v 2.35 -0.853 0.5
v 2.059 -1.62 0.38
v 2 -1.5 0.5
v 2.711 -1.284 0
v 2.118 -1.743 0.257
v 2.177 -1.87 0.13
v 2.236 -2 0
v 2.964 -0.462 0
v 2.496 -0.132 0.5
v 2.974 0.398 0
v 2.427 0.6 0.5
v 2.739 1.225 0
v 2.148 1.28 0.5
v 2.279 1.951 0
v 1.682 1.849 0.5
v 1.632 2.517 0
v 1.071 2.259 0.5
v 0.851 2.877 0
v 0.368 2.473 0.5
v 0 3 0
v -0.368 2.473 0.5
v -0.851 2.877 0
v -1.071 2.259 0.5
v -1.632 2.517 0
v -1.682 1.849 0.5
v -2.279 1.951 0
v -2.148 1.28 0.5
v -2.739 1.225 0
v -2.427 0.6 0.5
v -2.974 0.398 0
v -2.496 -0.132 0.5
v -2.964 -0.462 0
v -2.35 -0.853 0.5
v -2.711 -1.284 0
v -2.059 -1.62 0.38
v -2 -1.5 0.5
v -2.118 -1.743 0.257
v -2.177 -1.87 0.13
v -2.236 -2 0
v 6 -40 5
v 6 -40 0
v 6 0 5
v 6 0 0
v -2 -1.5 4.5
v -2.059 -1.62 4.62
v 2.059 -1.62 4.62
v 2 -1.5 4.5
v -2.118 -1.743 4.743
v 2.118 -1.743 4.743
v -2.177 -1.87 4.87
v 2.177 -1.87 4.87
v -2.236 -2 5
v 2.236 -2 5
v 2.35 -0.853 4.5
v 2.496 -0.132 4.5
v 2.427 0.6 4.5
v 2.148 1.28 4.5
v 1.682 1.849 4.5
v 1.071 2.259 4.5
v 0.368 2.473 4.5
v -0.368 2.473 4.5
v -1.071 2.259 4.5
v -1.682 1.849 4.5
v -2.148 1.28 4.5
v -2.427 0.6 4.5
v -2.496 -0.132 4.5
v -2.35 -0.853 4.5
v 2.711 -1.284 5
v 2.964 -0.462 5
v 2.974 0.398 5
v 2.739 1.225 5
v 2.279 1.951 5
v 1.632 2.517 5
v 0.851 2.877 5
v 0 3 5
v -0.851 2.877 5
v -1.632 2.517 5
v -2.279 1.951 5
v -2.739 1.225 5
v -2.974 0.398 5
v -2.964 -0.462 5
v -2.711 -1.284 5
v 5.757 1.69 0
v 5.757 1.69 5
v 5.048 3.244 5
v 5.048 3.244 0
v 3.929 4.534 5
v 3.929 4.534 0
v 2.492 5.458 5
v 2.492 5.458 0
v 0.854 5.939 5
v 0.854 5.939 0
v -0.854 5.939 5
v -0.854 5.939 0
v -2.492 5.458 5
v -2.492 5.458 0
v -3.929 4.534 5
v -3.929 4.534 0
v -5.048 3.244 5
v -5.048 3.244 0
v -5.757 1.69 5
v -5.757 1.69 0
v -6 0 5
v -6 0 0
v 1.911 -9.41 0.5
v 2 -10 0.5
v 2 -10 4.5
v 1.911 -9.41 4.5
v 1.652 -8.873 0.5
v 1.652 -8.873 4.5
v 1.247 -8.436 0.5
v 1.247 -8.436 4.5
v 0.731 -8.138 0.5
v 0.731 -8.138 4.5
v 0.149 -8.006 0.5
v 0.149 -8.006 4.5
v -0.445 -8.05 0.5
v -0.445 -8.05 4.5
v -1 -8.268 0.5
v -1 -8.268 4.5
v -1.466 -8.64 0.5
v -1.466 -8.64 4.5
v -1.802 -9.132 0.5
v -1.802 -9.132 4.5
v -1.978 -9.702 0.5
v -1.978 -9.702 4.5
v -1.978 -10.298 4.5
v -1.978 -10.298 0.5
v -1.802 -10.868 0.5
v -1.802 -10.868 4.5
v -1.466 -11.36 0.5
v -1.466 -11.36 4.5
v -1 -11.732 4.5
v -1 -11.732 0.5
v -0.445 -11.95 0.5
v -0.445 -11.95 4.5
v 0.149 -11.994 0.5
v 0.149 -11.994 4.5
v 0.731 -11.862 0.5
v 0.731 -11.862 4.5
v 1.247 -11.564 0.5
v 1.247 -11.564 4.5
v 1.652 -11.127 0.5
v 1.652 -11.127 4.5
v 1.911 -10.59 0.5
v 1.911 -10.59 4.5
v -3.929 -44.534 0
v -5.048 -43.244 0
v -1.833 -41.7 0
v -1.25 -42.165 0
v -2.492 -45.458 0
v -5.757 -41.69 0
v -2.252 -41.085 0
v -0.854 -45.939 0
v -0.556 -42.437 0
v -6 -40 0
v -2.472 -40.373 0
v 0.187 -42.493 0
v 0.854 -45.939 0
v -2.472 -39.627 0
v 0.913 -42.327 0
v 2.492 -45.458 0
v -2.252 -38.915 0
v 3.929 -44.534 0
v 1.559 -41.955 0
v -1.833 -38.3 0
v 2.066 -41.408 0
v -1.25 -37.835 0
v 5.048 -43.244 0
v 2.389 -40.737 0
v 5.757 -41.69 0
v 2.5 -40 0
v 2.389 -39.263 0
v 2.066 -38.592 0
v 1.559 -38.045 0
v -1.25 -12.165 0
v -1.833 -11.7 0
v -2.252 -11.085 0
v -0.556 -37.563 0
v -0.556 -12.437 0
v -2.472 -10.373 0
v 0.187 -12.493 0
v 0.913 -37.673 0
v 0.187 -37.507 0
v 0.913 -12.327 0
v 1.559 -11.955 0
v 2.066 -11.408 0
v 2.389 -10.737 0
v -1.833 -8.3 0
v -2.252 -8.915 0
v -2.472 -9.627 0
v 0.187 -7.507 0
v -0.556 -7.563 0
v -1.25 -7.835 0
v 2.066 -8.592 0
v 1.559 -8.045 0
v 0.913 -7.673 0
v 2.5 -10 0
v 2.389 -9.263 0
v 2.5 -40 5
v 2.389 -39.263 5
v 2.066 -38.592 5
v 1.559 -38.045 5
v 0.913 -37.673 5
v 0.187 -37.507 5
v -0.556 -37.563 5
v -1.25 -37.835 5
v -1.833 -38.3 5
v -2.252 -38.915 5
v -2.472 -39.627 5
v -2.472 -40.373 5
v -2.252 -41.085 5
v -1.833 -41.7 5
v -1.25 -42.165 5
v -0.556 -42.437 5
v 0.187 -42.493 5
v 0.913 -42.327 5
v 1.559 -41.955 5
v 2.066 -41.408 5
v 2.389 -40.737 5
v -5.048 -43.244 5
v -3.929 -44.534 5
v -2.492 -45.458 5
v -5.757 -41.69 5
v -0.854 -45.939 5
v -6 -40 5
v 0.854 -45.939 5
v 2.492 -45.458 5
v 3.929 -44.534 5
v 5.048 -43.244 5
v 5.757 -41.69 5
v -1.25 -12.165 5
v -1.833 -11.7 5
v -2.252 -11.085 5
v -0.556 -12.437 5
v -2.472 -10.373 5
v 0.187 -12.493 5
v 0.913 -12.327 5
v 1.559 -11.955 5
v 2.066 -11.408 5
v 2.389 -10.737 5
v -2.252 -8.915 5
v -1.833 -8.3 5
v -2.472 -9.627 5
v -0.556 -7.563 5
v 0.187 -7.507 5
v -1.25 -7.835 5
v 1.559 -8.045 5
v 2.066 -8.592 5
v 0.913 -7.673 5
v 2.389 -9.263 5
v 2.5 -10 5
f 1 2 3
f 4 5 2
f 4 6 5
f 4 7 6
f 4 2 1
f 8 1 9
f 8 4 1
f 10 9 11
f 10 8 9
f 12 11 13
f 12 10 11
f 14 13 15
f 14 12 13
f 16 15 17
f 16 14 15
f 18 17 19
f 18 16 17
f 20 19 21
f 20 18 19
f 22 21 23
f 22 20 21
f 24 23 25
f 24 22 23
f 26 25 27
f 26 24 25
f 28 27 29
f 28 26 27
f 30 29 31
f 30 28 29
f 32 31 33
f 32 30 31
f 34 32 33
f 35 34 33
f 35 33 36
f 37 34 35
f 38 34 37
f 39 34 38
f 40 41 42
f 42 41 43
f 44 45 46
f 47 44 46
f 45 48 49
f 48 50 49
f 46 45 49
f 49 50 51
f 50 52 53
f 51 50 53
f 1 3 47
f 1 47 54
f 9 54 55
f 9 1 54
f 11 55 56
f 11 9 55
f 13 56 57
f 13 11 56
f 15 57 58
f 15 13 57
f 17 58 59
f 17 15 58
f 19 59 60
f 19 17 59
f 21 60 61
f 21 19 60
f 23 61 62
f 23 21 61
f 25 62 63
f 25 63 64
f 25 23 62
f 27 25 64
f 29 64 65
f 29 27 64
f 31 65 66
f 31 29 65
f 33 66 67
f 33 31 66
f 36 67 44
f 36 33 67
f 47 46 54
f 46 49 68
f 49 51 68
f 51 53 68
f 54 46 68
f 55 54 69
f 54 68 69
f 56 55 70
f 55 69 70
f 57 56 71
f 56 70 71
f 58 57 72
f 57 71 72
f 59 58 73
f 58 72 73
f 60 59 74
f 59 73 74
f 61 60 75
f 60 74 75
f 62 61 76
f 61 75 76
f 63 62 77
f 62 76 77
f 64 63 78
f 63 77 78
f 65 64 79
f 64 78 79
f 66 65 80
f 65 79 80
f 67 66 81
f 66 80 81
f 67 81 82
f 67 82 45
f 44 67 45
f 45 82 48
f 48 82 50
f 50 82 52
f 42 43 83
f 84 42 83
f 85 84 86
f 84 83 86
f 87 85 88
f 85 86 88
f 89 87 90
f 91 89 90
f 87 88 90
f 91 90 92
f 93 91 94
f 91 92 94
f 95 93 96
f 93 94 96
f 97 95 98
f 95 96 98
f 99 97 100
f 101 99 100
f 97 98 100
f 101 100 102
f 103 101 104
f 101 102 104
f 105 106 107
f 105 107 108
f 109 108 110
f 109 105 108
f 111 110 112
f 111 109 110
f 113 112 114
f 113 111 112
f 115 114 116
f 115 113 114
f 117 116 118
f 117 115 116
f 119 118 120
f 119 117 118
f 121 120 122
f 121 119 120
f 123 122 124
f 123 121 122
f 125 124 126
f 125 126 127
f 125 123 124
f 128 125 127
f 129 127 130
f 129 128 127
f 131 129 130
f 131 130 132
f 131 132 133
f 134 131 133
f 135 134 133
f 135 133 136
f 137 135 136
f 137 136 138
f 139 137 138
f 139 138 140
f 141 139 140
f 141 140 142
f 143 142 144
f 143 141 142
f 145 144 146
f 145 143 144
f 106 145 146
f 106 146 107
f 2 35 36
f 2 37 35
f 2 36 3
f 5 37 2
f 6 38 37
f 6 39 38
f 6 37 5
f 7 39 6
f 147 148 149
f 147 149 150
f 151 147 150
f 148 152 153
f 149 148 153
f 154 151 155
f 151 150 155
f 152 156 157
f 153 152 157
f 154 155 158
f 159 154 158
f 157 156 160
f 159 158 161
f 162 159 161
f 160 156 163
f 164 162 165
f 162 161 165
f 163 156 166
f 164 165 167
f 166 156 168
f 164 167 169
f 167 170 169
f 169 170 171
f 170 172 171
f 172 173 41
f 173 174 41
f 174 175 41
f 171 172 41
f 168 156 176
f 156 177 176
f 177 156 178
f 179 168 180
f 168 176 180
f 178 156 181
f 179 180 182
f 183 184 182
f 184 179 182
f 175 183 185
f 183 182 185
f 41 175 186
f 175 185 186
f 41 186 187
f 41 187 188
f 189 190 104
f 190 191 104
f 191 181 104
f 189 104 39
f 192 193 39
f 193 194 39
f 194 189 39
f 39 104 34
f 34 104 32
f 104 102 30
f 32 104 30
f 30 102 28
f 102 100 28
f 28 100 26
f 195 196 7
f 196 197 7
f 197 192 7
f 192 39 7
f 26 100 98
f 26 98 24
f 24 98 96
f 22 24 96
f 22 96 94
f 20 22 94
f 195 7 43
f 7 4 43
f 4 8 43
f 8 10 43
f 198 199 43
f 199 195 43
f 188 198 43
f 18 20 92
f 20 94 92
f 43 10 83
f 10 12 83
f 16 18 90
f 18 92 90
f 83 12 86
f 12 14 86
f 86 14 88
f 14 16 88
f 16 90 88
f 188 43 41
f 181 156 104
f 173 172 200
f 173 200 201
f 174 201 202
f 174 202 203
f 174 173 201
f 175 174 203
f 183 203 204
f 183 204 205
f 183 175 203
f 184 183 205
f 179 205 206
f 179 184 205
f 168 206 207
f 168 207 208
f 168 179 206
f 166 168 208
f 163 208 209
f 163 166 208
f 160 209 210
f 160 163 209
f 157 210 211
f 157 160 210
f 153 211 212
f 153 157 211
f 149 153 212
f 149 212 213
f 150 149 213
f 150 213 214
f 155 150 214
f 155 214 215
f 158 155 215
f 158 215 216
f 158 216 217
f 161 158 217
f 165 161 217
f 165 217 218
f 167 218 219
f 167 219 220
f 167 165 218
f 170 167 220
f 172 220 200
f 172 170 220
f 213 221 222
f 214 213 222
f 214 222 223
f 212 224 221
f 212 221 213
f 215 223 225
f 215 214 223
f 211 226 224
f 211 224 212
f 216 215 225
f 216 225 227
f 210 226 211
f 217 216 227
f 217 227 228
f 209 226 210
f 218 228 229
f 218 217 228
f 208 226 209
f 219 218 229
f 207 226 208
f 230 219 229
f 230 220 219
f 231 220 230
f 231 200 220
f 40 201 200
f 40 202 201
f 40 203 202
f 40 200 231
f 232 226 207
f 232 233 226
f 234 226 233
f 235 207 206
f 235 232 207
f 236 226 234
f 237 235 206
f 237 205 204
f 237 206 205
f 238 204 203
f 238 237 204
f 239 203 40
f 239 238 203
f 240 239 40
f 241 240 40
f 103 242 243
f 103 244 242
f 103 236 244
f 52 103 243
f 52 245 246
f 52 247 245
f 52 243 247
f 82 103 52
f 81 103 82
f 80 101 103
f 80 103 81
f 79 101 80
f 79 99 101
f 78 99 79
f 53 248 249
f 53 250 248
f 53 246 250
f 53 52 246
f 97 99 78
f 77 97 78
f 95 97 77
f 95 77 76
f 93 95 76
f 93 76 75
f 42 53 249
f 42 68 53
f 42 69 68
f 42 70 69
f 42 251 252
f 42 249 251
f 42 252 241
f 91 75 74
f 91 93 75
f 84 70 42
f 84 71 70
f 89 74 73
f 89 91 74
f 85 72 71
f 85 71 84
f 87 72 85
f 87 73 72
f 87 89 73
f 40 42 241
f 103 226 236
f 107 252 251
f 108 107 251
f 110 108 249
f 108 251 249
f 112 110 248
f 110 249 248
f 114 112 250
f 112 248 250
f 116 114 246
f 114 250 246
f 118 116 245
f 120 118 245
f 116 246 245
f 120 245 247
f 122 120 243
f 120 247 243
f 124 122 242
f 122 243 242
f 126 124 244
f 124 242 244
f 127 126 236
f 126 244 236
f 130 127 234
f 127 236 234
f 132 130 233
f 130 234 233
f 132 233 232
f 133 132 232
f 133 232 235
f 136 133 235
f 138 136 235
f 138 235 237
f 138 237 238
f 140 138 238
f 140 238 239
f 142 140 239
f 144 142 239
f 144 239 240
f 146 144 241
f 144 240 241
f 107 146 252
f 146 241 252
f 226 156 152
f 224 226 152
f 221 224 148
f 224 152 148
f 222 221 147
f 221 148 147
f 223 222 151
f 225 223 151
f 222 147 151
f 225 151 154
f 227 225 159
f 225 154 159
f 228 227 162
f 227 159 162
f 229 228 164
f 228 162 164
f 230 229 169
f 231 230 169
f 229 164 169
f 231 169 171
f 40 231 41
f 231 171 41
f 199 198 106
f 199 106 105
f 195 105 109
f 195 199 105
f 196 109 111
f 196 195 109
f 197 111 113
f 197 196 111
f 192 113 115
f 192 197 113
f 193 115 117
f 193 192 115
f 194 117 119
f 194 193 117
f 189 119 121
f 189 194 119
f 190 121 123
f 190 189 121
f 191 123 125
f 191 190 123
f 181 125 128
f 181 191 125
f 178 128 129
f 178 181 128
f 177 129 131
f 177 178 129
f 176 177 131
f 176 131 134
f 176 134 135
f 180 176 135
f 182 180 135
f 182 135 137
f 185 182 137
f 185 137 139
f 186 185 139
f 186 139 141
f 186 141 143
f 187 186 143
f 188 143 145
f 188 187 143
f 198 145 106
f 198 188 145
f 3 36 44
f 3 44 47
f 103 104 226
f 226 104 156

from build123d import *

# Parameters (mm, degrees)
SZKIC1_R                    = 2.5
SZKIC1_R_2                  = 2
DODANIE_WYCI_GNI_CIE1_DEPTH = 5
SFAZOWANIE1_SIZE            = 0.5


with BuildPart() as part:
    # Szkic1 → Dodanie-wyciągnięcie1 (new body)
    with BuildSketch(Plane.XY):
        with BuildLine():
            Line((6, -40), (6, 0))
            ThreePointArc((6, 0), (0, 6), (-6, 0))
            Line((-6, 0), (-6, -40))
            ThreePointArc((-6, -40), (0, -46), (6, -40))
        make_face()
        with Locations((0, -40)):
            Circle(SZKIC1_R, mode=Mode.SUBTRACT)
        with Locations((0, -10)):
            Circle(SZKIC1_R_2, mode=Mode.SUBTRACT)
        with BuildLine():
            Line((-2, -1.5), (2, -1.5))
            ThreePointArc((2, -1.5), (0, 2.5), (-2, -1.5))
        make_face(mode=Mode.SUBTRACT)
    extrude(amount=DODANIE_WYCI_GNI_CIE1_DEPTH)

    # Sfazowanie1
    sfazowanie1_edges = [part.edges().sort_by_distance(p)[0] for p in [
        (0, -1.5, 0),
        (0, 2.5, 0),
        (-2, -10, 0),
        (0, 2.5, 5),
        (0, -1.5, 5),
        (-2, -10, 5),
    ]]
    chamfer(sfazowanie1_edges, length=SFAZOWANIE1_SIZE)


solid = part.part
